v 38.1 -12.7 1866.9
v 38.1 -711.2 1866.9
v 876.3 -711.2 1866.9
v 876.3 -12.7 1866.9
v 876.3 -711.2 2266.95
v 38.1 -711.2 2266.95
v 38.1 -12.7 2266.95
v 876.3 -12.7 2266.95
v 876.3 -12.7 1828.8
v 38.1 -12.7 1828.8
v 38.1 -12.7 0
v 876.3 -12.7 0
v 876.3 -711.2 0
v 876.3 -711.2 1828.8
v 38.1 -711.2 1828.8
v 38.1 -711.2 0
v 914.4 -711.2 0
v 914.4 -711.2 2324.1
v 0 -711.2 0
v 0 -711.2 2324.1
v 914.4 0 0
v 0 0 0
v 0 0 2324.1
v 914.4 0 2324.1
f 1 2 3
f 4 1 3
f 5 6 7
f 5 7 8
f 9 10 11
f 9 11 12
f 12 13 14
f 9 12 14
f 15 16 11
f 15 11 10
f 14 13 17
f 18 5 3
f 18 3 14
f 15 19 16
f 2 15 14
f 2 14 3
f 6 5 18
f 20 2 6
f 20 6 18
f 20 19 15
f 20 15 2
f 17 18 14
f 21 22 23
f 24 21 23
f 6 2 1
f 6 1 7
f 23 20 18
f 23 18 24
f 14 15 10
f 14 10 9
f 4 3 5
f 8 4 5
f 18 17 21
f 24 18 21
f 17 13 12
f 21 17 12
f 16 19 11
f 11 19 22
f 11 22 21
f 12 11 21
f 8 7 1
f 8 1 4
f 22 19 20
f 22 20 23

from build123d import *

# Parameters (mm, degrees)
F0_W     = 711.2
F0_H     = 2324.1
F1_DEPTH = 914.4
F2_W     = 838.2
F2_H     = 1828.8
F2_H_2   = 400.05
F3_DEPTH = 698.5


with BuildPart() as f1:
    # F0 (on Right) → F1 (new body)
    with BuildSketch(Plane.YZ):
        with Locations((-355.6, 1162.05)):
            Rectangle(F0_W, F0_H)
    extrude(amount=F1_DEPTH)

    # F2 (on face) → F3 (cut)
    with BuildSketch(Plane.XZ.offset(711.2)):
        with Locations((457.2, 914.4)):
            Rectangle(F2_W, F2_H)
        with Locations((457.2, 2066.925)):
            Rectangle(F2_W, F2_H_2)
    extrude(amount=-F3_DEPTH, mode=Mode.SUBTRACT)


solid = f1.part
